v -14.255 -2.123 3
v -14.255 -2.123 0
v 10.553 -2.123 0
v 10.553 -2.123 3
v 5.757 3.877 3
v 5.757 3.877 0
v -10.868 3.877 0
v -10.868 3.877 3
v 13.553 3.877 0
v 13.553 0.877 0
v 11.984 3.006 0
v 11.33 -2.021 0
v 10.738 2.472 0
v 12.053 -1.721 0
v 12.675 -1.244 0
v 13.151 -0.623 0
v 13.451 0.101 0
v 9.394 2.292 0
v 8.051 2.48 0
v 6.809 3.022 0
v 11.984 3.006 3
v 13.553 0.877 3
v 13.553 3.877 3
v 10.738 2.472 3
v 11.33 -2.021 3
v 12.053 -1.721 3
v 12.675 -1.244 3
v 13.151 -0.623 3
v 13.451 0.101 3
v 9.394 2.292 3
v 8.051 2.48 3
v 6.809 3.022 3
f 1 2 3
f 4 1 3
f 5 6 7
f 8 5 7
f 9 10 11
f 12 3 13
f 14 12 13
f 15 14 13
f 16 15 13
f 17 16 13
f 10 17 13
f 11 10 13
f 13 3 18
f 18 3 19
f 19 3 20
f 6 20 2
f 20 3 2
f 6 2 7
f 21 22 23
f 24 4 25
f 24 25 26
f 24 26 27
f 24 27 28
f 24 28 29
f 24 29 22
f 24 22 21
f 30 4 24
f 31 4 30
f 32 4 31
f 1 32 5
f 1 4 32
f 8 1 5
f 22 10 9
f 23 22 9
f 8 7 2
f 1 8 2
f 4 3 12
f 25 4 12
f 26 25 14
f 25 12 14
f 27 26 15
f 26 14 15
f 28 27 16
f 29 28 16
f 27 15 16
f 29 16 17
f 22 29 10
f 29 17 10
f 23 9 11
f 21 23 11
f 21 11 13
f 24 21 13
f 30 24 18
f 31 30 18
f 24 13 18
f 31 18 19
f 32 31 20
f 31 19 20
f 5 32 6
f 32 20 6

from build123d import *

# Parameters (mm, degrees)
BOSS_EXTRUDE1_DEPTH = 3


with BuildPart() as part:
    # Sketch1 → Boss-Extrude1 (new body)
    with BuildSketch(Plane(origin=(0, 0, 0), x_dir=(0, 1, 0), z_dir=(0, 0, 1))):
        with BuildLine():
            Line((-2.122941602, 14.254932242), (-2.122941602, -10.553285524))
            ThreePointArc((-2.122941602, -10.553285524), (-1.244261946, -12.674605867), (0.877058398, -13.553285524))
            Line((0.877058398, -13.553285524), (3.877058398, -13.553285524))
            Line((3.877058398, -13.553285524), (3.006420494, -11.983925105))
            ThreePointArc((3.006420494, -11.983925105), (2.340422166, -8.716396804), (3.877058398, -5.756828581))
            Line((3.877058398, -5.756828581), (3.877058398, 10.86753602))
            Line((3.877058398, 10.86753602), (-2.122941602, 14.254932242))
        make_face()
    extrude(amount=BOSS_EXTRUDE1_DEPTH)


solid = part.part
